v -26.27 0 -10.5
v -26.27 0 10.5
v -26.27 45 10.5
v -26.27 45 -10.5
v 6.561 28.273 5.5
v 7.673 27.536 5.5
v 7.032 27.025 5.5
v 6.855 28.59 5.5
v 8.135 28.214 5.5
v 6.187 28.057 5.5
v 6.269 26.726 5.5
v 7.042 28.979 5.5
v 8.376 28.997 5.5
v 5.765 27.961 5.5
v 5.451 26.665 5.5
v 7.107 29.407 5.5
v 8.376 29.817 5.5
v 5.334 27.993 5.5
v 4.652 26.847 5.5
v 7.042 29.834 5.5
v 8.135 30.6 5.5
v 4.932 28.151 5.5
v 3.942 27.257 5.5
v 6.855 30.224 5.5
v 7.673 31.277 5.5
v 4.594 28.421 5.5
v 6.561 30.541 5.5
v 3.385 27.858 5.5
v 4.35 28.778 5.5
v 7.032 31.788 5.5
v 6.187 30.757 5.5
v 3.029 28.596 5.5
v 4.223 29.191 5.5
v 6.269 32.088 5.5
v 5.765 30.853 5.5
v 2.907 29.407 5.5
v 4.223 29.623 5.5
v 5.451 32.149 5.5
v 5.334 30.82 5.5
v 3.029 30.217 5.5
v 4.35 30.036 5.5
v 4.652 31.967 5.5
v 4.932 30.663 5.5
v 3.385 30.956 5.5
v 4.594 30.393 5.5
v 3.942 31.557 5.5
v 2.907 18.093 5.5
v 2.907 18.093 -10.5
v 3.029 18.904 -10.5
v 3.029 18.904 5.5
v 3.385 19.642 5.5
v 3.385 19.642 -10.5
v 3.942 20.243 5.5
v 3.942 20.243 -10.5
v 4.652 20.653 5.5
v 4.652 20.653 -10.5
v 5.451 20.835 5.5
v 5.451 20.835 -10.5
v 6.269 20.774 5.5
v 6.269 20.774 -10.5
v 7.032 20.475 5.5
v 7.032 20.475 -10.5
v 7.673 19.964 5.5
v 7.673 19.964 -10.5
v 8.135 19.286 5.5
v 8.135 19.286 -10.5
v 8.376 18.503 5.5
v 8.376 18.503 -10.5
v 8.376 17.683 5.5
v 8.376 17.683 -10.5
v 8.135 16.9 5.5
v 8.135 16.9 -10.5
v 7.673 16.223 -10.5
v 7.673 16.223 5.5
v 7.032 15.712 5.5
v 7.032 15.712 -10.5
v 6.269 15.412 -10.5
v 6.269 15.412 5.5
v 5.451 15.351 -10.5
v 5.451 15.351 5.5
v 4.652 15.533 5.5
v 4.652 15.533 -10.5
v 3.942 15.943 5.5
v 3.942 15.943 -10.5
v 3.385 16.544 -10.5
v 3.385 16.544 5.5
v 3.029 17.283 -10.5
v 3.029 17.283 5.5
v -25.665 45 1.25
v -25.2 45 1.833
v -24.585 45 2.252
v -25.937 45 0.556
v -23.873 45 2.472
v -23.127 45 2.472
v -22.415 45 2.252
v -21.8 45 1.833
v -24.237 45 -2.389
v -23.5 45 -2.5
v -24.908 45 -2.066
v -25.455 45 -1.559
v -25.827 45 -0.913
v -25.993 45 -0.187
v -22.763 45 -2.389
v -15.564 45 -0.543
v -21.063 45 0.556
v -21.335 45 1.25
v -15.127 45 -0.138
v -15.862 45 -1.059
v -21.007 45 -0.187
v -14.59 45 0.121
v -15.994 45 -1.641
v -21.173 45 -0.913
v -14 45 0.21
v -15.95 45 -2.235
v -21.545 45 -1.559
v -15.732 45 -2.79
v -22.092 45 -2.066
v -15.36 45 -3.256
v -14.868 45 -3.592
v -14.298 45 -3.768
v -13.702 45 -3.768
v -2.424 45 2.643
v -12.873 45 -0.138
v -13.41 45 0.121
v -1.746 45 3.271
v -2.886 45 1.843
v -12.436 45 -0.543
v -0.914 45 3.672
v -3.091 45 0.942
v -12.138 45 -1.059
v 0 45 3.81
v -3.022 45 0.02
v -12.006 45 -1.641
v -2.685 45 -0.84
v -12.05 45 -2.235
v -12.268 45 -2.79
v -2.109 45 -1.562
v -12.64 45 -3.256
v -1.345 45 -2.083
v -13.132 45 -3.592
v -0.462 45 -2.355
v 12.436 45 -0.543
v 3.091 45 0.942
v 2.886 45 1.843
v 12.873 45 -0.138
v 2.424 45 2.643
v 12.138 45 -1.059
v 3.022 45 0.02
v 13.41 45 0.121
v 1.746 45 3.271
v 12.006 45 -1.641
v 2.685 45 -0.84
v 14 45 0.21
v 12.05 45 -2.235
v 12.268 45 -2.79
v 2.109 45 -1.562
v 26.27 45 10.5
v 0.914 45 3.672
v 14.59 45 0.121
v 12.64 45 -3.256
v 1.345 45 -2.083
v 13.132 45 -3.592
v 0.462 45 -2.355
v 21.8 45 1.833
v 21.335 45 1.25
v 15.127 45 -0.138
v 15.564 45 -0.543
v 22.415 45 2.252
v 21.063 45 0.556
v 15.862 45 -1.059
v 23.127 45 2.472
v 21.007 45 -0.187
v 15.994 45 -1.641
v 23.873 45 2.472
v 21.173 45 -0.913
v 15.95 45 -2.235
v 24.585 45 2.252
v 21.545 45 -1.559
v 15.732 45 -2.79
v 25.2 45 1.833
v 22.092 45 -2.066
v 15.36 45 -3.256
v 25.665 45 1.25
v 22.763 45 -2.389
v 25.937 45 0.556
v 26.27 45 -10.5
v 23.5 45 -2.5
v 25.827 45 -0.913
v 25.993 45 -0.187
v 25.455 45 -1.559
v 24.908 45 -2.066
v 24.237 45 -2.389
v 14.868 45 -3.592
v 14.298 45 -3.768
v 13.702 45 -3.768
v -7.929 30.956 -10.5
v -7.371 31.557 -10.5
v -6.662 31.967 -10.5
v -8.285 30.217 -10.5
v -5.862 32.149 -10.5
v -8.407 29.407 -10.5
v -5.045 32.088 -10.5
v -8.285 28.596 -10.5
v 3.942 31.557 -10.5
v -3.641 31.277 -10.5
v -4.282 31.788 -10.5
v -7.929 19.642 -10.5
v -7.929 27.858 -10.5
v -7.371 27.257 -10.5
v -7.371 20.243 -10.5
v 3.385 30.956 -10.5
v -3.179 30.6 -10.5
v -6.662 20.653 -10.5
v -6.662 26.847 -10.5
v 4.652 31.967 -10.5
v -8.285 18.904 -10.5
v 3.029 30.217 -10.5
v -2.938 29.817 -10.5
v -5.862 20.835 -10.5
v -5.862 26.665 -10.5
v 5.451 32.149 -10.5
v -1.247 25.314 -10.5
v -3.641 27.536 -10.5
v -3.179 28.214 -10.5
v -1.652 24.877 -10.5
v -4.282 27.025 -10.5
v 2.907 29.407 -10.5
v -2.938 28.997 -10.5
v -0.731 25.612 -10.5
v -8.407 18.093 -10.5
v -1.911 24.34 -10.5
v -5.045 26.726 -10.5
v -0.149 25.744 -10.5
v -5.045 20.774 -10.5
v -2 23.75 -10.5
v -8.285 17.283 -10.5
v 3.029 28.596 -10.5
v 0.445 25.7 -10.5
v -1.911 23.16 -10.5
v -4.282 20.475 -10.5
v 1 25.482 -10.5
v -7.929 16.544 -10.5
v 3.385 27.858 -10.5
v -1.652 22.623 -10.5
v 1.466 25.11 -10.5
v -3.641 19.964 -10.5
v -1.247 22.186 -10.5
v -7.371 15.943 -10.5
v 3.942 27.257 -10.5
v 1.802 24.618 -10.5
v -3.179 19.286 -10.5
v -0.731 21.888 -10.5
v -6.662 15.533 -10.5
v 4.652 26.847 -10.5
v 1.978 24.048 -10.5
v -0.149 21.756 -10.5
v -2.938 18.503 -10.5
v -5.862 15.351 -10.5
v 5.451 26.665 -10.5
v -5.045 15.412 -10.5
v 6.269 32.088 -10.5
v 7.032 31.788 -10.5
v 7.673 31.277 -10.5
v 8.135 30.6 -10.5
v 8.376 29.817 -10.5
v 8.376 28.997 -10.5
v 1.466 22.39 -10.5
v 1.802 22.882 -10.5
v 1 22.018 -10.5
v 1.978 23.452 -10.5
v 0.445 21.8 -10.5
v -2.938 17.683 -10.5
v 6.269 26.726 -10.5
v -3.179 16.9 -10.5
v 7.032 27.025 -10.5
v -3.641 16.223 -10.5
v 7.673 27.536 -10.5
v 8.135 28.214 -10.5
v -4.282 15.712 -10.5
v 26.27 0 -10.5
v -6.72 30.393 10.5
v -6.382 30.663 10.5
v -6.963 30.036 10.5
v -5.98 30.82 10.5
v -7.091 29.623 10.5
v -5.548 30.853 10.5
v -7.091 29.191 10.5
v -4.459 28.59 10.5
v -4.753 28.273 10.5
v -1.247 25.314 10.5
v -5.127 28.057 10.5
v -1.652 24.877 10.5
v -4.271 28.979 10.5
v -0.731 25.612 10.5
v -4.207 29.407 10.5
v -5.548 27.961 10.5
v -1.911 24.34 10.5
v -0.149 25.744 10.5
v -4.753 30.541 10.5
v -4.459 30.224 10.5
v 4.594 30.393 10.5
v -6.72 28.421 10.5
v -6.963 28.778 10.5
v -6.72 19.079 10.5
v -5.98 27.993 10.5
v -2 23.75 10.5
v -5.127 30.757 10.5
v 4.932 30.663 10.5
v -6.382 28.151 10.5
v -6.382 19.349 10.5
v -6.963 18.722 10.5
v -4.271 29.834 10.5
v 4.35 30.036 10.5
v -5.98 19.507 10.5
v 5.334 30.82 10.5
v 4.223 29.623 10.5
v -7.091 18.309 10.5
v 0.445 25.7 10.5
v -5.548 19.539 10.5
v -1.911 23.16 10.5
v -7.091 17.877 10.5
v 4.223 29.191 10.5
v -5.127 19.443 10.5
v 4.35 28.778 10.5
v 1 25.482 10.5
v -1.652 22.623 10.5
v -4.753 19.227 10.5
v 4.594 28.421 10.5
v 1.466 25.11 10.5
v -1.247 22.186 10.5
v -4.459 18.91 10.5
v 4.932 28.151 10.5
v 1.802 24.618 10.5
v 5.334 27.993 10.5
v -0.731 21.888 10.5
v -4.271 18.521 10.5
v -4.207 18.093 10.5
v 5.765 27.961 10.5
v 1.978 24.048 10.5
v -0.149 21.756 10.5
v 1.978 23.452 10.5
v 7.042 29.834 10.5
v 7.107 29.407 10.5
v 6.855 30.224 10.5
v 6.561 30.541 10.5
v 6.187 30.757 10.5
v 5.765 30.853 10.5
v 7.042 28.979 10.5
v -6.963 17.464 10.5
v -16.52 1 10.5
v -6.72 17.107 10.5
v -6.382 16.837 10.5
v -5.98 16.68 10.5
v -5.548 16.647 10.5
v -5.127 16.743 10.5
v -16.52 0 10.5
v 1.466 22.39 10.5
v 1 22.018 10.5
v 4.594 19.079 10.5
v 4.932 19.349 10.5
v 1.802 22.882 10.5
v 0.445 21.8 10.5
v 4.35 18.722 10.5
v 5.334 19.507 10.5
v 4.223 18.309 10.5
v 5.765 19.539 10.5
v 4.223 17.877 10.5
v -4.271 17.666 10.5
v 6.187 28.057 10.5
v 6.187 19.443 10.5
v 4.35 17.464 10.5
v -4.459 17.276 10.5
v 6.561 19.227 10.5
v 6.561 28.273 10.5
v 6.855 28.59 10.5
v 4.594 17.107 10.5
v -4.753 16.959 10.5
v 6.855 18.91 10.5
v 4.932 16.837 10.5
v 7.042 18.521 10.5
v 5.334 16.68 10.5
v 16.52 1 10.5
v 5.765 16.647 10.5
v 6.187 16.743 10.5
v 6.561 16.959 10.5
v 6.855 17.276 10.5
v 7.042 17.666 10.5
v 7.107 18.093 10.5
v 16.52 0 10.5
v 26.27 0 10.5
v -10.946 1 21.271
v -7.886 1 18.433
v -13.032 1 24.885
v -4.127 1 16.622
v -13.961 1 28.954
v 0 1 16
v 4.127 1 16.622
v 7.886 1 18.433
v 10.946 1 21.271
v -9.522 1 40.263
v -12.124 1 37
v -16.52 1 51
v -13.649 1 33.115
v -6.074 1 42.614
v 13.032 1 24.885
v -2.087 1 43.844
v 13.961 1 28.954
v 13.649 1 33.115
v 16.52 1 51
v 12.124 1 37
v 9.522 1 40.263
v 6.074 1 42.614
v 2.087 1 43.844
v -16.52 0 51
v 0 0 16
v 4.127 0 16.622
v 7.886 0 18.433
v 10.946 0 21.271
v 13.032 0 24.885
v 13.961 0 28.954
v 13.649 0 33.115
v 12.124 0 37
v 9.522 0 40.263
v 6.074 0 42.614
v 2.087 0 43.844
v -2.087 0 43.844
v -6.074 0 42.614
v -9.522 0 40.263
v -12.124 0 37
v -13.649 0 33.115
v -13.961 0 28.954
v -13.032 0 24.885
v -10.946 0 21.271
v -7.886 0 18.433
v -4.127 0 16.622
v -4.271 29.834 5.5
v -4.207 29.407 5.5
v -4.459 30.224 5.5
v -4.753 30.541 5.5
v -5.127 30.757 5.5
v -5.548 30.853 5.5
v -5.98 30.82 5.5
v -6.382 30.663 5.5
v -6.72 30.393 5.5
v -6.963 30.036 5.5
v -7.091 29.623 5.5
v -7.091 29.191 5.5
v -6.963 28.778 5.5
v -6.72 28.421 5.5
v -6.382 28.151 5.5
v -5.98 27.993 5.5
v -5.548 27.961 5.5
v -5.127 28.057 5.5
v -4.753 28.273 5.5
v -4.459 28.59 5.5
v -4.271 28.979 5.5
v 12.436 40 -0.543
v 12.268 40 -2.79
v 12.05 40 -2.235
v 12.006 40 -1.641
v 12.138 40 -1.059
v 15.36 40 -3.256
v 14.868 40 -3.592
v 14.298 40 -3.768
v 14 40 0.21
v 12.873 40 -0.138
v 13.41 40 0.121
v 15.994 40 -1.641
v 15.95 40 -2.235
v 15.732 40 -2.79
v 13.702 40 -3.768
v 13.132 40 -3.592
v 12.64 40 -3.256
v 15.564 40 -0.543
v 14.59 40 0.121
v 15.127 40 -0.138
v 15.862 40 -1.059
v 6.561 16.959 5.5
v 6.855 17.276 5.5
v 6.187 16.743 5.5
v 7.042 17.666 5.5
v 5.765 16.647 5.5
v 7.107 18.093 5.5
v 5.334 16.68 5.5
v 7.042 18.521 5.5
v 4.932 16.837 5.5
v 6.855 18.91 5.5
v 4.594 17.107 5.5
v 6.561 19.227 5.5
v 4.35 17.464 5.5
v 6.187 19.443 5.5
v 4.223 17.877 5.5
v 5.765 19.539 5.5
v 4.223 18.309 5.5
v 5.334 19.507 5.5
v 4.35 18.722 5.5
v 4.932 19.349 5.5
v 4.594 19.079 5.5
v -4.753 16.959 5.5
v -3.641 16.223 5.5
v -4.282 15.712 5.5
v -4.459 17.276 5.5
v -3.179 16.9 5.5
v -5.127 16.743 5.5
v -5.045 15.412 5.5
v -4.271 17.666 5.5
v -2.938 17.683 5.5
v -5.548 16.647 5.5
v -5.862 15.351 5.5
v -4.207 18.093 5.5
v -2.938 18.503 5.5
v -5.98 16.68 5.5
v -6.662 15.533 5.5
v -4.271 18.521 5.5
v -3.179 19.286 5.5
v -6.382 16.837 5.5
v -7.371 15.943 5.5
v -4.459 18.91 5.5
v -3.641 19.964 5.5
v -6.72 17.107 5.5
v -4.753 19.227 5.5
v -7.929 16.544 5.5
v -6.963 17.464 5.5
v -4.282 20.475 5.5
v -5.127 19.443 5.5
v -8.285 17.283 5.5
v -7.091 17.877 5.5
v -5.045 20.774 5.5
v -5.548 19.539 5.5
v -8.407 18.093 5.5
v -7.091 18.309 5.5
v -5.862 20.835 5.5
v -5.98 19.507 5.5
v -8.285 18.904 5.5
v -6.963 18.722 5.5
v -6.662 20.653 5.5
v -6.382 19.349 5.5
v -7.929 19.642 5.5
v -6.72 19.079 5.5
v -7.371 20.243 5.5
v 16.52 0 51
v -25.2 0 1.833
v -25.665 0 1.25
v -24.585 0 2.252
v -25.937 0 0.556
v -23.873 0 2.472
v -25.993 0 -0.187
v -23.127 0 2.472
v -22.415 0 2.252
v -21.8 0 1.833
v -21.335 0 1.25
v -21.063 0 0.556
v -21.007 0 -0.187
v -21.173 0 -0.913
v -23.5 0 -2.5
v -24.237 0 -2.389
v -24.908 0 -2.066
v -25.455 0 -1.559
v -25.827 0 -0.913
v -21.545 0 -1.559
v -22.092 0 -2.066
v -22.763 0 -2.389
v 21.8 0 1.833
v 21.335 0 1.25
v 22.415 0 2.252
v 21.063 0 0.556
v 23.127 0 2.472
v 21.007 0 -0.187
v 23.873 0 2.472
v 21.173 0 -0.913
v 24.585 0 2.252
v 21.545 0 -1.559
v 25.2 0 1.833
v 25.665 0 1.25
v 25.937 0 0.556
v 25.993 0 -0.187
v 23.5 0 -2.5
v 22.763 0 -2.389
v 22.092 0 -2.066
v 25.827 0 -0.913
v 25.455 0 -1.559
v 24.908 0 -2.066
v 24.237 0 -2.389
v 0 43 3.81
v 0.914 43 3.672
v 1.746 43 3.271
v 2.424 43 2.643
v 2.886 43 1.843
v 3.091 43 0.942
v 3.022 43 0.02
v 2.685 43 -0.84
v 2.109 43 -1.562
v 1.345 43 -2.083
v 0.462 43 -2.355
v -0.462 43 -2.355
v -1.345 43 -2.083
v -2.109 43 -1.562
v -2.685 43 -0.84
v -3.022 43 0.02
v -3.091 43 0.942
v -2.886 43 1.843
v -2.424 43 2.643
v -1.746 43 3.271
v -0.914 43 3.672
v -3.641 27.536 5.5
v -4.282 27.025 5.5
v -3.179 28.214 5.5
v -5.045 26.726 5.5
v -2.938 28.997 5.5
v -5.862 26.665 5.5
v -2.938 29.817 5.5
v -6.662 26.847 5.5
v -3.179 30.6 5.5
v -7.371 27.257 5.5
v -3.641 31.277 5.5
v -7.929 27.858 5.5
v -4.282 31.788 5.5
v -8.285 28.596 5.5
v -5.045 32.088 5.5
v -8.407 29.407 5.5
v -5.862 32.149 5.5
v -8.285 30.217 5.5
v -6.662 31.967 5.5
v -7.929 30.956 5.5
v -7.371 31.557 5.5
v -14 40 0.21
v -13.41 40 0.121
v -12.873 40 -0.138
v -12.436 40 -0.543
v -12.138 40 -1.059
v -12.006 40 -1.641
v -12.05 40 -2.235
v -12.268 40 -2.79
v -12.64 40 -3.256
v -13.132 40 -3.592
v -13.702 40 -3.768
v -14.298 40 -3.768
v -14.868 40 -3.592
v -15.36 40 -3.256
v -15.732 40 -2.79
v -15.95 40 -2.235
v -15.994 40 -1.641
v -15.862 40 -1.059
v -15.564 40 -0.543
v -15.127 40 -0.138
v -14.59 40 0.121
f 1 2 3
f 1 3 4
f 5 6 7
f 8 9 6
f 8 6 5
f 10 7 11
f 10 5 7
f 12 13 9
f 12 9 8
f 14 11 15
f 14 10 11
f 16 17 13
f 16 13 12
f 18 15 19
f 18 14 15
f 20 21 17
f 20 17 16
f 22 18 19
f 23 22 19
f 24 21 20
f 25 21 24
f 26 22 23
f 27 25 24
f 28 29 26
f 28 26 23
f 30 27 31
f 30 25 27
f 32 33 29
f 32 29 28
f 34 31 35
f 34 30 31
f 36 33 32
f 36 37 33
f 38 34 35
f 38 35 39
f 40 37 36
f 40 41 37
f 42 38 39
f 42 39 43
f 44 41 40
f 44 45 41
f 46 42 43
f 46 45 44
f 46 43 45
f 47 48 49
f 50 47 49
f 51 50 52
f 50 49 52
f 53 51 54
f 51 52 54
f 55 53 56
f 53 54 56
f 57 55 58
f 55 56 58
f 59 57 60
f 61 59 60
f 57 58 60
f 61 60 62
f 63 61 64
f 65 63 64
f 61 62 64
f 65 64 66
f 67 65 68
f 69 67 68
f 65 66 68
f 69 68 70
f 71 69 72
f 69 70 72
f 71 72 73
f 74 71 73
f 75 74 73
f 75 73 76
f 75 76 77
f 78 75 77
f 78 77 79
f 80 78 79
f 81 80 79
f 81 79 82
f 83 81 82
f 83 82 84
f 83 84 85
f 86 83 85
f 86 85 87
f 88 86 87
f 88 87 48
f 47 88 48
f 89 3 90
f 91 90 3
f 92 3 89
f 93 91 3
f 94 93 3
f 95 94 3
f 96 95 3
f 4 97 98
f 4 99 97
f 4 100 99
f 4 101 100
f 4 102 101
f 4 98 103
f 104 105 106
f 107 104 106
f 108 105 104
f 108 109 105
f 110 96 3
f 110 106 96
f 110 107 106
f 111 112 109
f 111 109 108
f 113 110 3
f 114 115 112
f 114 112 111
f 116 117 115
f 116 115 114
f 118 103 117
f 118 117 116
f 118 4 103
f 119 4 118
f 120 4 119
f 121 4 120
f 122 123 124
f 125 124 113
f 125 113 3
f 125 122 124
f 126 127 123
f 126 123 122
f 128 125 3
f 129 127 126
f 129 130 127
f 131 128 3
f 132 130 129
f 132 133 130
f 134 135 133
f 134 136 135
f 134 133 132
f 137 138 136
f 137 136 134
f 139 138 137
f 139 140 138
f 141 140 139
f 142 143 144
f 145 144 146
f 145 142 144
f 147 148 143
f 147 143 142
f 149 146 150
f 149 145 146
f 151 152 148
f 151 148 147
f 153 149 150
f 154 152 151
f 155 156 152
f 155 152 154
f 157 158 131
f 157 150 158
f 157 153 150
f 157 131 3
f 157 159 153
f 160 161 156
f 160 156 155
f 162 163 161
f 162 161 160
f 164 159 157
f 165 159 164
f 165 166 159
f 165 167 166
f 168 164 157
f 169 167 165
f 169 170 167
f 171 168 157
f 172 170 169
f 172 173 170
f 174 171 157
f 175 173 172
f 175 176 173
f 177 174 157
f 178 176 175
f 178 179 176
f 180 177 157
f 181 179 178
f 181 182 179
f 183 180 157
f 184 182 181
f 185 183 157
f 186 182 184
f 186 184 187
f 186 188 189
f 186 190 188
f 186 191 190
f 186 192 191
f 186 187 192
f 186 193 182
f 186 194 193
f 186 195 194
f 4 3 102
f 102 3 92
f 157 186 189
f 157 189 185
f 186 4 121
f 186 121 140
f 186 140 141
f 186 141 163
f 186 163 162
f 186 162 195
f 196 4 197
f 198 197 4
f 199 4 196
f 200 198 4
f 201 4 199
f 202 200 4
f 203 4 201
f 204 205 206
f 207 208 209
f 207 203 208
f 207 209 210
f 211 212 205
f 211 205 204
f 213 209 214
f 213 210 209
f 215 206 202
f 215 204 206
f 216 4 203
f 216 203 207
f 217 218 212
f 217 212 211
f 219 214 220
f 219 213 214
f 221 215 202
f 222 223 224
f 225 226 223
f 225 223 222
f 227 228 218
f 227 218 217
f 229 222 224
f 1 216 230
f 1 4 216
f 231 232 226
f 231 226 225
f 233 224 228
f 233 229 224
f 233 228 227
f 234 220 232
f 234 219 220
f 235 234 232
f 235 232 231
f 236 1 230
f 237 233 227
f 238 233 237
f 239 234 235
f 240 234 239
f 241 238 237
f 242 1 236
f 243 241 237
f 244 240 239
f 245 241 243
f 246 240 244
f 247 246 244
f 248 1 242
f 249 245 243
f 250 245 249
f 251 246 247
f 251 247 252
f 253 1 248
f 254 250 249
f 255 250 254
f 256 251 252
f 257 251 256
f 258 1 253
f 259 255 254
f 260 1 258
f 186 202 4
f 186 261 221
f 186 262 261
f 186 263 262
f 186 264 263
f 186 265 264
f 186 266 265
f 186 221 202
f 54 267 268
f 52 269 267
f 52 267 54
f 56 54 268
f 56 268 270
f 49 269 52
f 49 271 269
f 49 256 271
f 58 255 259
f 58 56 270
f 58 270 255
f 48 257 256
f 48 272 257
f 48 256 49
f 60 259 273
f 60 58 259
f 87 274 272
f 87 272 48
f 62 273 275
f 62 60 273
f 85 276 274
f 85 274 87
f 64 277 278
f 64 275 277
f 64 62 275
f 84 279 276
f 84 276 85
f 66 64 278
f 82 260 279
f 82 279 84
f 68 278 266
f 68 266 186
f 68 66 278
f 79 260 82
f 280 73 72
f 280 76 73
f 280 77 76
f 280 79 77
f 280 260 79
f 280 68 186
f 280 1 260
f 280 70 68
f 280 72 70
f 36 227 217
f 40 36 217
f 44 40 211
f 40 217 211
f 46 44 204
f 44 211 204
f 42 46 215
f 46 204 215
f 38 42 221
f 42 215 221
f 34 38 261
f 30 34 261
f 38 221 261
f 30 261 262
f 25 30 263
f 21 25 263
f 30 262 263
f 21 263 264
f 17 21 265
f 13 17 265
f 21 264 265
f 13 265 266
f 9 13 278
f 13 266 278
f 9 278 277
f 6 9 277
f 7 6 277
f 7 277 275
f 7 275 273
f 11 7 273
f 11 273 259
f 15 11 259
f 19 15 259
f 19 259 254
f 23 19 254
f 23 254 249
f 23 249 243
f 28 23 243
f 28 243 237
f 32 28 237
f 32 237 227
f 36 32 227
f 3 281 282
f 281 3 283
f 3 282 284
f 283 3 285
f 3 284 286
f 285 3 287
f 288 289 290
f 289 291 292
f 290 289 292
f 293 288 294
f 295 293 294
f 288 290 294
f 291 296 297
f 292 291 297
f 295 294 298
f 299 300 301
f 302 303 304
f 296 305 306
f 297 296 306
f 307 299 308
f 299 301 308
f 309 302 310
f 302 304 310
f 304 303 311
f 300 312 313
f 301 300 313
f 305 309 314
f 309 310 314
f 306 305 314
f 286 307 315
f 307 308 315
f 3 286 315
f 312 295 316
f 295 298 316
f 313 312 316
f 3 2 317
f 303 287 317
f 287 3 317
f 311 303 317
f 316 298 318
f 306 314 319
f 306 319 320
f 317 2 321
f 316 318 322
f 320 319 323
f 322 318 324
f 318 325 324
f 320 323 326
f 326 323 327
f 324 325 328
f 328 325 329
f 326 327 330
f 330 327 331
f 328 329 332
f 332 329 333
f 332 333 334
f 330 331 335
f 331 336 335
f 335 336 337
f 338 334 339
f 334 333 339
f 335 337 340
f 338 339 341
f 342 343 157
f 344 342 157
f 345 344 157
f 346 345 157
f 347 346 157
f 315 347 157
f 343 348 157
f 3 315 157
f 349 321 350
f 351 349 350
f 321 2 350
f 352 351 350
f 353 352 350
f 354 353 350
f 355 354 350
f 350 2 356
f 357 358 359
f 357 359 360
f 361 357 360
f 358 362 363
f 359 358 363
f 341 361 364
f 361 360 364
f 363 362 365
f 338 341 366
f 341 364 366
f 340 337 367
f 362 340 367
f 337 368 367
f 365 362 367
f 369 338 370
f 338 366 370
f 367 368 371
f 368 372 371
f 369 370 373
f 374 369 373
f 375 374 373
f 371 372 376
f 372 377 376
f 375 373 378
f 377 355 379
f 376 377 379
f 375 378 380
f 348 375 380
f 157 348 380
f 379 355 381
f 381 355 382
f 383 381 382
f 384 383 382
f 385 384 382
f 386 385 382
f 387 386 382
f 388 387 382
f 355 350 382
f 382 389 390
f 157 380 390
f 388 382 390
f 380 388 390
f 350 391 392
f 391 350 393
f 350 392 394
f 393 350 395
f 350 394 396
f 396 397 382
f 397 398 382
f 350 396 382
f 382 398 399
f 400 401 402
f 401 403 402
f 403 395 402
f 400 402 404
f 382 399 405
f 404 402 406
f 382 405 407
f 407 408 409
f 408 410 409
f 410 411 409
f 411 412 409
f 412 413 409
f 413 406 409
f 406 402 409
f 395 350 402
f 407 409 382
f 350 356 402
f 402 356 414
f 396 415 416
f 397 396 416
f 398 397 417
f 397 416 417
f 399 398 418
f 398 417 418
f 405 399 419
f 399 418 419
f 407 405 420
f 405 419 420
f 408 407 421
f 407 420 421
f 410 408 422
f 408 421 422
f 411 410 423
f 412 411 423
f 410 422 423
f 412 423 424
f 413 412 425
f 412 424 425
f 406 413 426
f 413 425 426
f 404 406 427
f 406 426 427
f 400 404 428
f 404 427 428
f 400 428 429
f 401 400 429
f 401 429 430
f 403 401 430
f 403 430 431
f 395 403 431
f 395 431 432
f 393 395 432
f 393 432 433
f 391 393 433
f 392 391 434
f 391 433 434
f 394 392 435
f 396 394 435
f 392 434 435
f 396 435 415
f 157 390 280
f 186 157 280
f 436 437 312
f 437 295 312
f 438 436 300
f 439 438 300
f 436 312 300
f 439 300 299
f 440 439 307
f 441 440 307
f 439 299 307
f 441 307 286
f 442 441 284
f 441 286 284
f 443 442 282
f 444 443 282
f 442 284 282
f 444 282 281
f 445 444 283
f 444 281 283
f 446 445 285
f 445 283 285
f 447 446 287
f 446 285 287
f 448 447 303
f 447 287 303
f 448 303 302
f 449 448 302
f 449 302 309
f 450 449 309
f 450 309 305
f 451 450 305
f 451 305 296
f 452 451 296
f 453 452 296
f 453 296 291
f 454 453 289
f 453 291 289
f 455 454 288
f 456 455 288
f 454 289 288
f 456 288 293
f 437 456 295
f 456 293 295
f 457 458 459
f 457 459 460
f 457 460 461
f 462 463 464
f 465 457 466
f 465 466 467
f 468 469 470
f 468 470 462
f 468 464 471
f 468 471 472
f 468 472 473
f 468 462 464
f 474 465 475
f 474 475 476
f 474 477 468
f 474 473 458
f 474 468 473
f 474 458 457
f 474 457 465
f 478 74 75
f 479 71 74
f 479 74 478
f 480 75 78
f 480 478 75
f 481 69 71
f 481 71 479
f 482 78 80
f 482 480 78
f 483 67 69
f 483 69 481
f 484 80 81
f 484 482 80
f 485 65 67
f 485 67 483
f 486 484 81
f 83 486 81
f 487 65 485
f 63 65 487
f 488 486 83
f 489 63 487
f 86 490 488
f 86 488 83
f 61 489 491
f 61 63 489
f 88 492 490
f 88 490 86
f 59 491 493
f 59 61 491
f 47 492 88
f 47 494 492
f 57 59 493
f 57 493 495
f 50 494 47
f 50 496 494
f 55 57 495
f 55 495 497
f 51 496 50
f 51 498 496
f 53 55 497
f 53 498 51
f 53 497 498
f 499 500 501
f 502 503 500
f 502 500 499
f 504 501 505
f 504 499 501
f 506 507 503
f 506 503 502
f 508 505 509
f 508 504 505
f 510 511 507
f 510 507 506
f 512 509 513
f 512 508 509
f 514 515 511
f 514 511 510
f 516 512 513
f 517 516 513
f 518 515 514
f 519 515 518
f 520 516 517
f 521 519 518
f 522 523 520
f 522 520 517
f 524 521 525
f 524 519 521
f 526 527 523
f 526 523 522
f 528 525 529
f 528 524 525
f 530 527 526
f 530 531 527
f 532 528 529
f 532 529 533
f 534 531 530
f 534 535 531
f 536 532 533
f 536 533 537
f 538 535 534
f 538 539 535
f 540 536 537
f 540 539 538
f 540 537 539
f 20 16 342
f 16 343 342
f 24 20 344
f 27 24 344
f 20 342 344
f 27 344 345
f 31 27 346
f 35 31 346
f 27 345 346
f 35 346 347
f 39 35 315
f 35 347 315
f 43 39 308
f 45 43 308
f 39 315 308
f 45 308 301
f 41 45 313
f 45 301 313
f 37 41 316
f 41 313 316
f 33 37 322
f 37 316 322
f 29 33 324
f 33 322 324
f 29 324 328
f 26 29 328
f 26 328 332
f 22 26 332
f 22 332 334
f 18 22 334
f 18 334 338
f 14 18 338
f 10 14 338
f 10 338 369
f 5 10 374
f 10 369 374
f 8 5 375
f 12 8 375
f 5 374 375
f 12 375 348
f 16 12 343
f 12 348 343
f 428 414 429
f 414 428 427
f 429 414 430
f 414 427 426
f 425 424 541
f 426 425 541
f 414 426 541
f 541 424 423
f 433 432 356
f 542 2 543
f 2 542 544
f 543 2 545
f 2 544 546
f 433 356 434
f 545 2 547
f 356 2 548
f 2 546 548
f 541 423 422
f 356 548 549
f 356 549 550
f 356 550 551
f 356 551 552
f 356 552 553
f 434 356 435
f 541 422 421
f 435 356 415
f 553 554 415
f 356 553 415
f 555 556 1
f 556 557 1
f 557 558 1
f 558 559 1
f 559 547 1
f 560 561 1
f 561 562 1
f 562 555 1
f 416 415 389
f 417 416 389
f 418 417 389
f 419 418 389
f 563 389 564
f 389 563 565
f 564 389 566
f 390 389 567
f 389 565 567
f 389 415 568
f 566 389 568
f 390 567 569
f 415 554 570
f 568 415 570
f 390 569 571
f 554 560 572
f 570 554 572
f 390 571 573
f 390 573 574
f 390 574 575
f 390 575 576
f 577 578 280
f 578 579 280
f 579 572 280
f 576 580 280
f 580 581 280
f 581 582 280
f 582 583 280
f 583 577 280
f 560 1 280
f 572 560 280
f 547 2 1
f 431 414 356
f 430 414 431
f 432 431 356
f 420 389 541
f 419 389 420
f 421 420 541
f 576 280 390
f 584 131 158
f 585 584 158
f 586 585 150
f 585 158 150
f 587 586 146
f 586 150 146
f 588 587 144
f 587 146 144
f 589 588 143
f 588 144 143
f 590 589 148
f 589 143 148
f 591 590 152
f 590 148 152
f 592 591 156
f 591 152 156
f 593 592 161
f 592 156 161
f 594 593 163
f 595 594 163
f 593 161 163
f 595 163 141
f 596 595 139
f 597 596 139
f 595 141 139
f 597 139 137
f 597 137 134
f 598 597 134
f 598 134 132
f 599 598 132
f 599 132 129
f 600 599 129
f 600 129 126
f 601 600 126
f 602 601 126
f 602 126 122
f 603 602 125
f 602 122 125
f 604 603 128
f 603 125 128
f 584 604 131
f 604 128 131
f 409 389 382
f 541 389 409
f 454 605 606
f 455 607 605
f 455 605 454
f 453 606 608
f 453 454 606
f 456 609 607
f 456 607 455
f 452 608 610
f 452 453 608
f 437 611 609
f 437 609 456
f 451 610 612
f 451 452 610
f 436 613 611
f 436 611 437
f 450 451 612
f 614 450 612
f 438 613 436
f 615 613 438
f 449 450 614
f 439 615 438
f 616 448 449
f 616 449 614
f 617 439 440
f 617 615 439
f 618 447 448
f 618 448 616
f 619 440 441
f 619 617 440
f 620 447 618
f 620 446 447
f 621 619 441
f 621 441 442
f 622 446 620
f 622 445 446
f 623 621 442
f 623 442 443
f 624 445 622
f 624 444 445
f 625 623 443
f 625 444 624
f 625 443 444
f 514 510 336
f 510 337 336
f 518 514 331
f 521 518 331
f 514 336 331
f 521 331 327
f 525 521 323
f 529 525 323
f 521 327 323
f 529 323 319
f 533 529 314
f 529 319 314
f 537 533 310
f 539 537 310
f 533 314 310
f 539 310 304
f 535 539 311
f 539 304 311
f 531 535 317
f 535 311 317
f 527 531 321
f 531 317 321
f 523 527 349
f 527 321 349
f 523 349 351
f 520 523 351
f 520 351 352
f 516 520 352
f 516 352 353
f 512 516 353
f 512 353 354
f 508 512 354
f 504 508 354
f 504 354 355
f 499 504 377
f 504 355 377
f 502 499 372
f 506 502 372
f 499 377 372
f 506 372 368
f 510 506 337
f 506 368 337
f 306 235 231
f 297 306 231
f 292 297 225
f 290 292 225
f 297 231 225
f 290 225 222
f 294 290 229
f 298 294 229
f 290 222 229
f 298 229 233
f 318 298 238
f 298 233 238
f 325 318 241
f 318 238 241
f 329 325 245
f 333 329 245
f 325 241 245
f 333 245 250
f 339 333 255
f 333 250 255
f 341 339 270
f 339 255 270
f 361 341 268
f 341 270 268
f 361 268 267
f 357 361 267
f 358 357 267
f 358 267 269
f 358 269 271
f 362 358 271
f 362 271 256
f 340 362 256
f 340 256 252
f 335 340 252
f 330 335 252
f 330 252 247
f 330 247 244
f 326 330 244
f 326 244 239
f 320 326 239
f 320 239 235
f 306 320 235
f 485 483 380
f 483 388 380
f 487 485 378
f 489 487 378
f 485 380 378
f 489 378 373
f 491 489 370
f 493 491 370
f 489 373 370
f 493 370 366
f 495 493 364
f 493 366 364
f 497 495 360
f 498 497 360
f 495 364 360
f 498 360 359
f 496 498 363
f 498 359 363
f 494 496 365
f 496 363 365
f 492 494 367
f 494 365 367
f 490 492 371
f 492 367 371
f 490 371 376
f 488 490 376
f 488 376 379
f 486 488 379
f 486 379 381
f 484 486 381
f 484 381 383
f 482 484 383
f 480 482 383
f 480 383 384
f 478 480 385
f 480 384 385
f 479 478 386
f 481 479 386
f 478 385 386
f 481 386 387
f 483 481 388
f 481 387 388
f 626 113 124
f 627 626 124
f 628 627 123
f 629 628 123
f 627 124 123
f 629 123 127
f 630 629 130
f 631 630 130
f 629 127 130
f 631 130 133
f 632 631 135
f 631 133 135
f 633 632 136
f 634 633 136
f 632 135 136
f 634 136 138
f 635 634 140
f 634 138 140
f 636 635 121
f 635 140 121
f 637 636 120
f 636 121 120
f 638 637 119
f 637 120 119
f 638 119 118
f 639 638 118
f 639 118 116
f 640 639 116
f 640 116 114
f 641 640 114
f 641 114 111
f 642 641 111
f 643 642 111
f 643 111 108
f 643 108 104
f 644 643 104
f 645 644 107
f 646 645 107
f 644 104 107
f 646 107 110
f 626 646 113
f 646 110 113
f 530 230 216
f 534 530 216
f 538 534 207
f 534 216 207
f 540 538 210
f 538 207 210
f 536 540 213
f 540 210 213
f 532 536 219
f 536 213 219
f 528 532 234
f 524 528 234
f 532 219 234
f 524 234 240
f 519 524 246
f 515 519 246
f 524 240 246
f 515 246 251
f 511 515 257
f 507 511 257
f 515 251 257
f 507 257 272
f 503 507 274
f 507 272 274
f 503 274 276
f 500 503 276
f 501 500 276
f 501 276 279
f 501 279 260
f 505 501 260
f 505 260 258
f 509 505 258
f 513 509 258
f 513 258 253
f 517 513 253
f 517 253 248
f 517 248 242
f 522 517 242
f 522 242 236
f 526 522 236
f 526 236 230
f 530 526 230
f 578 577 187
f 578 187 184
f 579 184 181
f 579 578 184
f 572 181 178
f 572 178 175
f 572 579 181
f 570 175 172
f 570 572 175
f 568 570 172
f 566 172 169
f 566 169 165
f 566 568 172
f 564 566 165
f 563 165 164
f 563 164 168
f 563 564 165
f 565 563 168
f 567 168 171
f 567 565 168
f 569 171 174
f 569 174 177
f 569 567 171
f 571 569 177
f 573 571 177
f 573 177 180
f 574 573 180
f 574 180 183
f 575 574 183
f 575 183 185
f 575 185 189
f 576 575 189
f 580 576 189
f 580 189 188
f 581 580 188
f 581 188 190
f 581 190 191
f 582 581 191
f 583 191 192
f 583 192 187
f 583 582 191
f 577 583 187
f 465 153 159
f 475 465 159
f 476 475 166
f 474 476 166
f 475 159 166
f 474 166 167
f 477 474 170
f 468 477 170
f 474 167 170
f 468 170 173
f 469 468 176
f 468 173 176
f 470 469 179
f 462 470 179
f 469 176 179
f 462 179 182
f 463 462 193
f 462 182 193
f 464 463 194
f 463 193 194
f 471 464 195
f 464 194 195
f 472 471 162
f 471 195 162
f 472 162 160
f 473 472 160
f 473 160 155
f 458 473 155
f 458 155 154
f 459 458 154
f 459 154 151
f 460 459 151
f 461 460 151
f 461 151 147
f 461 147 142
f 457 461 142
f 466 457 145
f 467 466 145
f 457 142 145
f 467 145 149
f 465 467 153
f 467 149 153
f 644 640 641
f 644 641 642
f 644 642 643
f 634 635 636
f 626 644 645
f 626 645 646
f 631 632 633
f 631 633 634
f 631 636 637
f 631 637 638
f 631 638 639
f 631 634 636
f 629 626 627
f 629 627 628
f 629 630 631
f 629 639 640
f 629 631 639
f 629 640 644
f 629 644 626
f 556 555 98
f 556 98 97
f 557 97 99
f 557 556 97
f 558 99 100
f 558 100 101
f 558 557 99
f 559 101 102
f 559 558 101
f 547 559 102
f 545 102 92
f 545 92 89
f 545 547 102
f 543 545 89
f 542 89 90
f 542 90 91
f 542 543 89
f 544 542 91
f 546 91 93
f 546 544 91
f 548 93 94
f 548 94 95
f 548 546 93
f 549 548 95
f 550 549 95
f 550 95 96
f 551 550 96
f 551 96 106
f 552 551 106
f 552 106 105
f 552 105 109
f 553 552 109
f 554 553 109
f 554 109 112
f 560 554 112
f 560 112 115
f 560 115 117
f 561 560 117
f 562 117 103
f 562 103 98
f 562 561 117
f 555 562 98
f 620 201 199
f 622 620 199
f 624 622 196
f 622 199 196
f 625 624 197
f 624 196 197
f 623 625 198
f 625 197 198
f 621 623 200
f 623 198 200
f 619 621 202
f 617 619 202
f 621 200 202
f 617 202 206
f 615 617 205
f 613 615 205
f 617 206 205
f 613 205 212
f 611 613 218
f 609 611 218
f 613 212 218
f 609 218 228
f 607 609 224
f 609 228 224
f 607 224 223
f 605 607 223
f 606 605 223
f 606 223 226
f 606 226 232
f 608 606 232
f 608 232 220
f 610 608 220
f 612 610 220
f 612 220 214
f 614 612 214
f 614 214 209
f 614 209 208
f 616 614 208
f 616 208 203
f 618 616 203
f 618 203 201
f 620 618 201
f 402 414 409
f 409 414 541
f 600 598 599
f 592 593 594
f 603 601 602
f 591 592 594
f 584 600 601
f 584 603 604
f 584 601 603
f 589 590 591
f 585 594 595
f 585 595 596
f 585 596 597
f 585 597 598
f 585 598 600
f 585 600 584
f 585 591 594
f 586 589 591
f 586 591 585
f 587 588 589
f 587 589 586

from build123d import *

# Parameters (mm, degrees)
SKETCH1_W                                            = 52.54
SKETCH1_H                                            = 21
SKETCH1_R                                            = 2.5
BOSS_EXTRUDE1_DEPTH                                  = 45
SKETCH2_R                                            = 2
CUT_EXTRUDE1_DEPTH                                   = 57.179292448
SKETCH3_R                                            = 2
CUT_EXTRUDE2_DEPTH                                   = 5
CBORE_FOR_M2_5_HEX_SOCKET_HEAD_CAP_SCREW_D           = 2.9
CBORE_FOR_M2_5_HEX_SOCKET_HEAD_CAP_SCREW_CBORE_D     = 5.5
CBORE_FOR_M2_5_HEX_SOCKET_HEAD_CAP_SCREW_CBORE_DEPTH = 16
SKETCH6_R                                            = 3.1
CUT_EXTRUDE3_DEPTH                                   = 2
SKETCH7_W                                            = 33.04
SKETCH7_H                                            = 40.5
SKETCH7_R                                            = 14
BOSS_EXTRUDE2_DEPTH                                  = 1


with BuildPart() as part:
    # Sketch1 → Boss-Extrude1 (new body)
    with BuildSketch(Plane(origin=(0, 0, 0), x_dir=(1, 0, 0), z_dir=(0, 1, 0))):
        Rectangle(SKETCH1_W, SKETCH1_H)
        with Locations(Location((23.5, 0, 0), (0, 0, 90))):
            Circle(SKETCH1_R, mode=Mode.SUBTRACT)
        with Locations(Location((-23.5, 0, 0), (0, 0, 90))):
            Circle(SKETCH1_R, mode=Mode.SUBTRACT)
    extrude(amount=BOSS_EXTRUDE1_DEPTH)

    # Sketch2 → Cut-Extrude1 (cut, through all)
    with BuildSketch(Plane(origin=(0, 0, -10.5), x_dir=(-1, 0, 0), z_dir=(0, 0, -1))):
        with Locations((0, 23.75)):
            Circle(SKETCH2_R)
    extrude(amount=-CUT_EXTRUDE1_DEPTH, mode=Mode.SUBTRACT)

    # Sketch3 → Cut-Extrude2 (cut)
    with BuildSketch(Plane(origin=(0, 45, 0), x_dir=(1, 0, 0), z_dir=(0, 1, 0))):
        with Locations(Location((-14, 1.79, 0), (0, 0, 270))):
            Circle(SKETCH3_R)
        with Locations(Location((14, 1.79, 0), (0, 0, 270))):
            Circle(SKETCH3_R)
    extrude(amount=-CUT_EXTRUDE2_DEPTH, mode=Mode.SUBTRACT)

    # CBORE for M2.5 Hex Socket Head Cap Screw1 (through all)
    with Locations(Plane(origin=(-5.656854249, 18.093145751, -10.5), x_dir=(-1, 0, 0), z_dir=(0, 0, -1))):
        with Locations((0, 0), (-11.313708498, 0), (-11.313708498, 11.313708498), (0, 11.313708498)):
            CounterBoreHole(CBORE_FOR_M2_5_HEX_SOCKET_HEAD_CAP_SCREW_D / 2, CBORE_FOR_M2_5_HEX_SOCKET_HEAD_CAP_SCREW_CBORE_D / 2, CBORE_FOR_M2_5_HEX_SOCKET_HEAD_CAP_SCREW_CBORE_DEPTH)

    # Sketch6 → Cut-Extrude3 (cut)
    with BuildSketch(Plane(origin=(0, 45, 0), x_dir=(1, 0, 0), z_dir=(0, 1, 0))):
        with Locations(Location((0, -0.71, 0), (0, 0, 270))):
            Circle(SKETCH6_R)
    extrude(amount=-CUT_EXTRUDE3_DEPTH, mode=Mode.SUBTRACT)

    # Sketch7 → Boss-Extrude2 (add)
    with BuildSketch(Plane.XZ):
        with Locations((0, 30.75)):
            Rectangle(SKETCH7_W, SKETCH7_H)
        with Locations(Location((0, 30, 0), (0, 0, 270))):
            Circle(SKETCH7_R, mode=Mode.SUBTRACT)
    extrude(amount=-BOSS_EXTRUDE2_DEPTH)


solid = part.part
